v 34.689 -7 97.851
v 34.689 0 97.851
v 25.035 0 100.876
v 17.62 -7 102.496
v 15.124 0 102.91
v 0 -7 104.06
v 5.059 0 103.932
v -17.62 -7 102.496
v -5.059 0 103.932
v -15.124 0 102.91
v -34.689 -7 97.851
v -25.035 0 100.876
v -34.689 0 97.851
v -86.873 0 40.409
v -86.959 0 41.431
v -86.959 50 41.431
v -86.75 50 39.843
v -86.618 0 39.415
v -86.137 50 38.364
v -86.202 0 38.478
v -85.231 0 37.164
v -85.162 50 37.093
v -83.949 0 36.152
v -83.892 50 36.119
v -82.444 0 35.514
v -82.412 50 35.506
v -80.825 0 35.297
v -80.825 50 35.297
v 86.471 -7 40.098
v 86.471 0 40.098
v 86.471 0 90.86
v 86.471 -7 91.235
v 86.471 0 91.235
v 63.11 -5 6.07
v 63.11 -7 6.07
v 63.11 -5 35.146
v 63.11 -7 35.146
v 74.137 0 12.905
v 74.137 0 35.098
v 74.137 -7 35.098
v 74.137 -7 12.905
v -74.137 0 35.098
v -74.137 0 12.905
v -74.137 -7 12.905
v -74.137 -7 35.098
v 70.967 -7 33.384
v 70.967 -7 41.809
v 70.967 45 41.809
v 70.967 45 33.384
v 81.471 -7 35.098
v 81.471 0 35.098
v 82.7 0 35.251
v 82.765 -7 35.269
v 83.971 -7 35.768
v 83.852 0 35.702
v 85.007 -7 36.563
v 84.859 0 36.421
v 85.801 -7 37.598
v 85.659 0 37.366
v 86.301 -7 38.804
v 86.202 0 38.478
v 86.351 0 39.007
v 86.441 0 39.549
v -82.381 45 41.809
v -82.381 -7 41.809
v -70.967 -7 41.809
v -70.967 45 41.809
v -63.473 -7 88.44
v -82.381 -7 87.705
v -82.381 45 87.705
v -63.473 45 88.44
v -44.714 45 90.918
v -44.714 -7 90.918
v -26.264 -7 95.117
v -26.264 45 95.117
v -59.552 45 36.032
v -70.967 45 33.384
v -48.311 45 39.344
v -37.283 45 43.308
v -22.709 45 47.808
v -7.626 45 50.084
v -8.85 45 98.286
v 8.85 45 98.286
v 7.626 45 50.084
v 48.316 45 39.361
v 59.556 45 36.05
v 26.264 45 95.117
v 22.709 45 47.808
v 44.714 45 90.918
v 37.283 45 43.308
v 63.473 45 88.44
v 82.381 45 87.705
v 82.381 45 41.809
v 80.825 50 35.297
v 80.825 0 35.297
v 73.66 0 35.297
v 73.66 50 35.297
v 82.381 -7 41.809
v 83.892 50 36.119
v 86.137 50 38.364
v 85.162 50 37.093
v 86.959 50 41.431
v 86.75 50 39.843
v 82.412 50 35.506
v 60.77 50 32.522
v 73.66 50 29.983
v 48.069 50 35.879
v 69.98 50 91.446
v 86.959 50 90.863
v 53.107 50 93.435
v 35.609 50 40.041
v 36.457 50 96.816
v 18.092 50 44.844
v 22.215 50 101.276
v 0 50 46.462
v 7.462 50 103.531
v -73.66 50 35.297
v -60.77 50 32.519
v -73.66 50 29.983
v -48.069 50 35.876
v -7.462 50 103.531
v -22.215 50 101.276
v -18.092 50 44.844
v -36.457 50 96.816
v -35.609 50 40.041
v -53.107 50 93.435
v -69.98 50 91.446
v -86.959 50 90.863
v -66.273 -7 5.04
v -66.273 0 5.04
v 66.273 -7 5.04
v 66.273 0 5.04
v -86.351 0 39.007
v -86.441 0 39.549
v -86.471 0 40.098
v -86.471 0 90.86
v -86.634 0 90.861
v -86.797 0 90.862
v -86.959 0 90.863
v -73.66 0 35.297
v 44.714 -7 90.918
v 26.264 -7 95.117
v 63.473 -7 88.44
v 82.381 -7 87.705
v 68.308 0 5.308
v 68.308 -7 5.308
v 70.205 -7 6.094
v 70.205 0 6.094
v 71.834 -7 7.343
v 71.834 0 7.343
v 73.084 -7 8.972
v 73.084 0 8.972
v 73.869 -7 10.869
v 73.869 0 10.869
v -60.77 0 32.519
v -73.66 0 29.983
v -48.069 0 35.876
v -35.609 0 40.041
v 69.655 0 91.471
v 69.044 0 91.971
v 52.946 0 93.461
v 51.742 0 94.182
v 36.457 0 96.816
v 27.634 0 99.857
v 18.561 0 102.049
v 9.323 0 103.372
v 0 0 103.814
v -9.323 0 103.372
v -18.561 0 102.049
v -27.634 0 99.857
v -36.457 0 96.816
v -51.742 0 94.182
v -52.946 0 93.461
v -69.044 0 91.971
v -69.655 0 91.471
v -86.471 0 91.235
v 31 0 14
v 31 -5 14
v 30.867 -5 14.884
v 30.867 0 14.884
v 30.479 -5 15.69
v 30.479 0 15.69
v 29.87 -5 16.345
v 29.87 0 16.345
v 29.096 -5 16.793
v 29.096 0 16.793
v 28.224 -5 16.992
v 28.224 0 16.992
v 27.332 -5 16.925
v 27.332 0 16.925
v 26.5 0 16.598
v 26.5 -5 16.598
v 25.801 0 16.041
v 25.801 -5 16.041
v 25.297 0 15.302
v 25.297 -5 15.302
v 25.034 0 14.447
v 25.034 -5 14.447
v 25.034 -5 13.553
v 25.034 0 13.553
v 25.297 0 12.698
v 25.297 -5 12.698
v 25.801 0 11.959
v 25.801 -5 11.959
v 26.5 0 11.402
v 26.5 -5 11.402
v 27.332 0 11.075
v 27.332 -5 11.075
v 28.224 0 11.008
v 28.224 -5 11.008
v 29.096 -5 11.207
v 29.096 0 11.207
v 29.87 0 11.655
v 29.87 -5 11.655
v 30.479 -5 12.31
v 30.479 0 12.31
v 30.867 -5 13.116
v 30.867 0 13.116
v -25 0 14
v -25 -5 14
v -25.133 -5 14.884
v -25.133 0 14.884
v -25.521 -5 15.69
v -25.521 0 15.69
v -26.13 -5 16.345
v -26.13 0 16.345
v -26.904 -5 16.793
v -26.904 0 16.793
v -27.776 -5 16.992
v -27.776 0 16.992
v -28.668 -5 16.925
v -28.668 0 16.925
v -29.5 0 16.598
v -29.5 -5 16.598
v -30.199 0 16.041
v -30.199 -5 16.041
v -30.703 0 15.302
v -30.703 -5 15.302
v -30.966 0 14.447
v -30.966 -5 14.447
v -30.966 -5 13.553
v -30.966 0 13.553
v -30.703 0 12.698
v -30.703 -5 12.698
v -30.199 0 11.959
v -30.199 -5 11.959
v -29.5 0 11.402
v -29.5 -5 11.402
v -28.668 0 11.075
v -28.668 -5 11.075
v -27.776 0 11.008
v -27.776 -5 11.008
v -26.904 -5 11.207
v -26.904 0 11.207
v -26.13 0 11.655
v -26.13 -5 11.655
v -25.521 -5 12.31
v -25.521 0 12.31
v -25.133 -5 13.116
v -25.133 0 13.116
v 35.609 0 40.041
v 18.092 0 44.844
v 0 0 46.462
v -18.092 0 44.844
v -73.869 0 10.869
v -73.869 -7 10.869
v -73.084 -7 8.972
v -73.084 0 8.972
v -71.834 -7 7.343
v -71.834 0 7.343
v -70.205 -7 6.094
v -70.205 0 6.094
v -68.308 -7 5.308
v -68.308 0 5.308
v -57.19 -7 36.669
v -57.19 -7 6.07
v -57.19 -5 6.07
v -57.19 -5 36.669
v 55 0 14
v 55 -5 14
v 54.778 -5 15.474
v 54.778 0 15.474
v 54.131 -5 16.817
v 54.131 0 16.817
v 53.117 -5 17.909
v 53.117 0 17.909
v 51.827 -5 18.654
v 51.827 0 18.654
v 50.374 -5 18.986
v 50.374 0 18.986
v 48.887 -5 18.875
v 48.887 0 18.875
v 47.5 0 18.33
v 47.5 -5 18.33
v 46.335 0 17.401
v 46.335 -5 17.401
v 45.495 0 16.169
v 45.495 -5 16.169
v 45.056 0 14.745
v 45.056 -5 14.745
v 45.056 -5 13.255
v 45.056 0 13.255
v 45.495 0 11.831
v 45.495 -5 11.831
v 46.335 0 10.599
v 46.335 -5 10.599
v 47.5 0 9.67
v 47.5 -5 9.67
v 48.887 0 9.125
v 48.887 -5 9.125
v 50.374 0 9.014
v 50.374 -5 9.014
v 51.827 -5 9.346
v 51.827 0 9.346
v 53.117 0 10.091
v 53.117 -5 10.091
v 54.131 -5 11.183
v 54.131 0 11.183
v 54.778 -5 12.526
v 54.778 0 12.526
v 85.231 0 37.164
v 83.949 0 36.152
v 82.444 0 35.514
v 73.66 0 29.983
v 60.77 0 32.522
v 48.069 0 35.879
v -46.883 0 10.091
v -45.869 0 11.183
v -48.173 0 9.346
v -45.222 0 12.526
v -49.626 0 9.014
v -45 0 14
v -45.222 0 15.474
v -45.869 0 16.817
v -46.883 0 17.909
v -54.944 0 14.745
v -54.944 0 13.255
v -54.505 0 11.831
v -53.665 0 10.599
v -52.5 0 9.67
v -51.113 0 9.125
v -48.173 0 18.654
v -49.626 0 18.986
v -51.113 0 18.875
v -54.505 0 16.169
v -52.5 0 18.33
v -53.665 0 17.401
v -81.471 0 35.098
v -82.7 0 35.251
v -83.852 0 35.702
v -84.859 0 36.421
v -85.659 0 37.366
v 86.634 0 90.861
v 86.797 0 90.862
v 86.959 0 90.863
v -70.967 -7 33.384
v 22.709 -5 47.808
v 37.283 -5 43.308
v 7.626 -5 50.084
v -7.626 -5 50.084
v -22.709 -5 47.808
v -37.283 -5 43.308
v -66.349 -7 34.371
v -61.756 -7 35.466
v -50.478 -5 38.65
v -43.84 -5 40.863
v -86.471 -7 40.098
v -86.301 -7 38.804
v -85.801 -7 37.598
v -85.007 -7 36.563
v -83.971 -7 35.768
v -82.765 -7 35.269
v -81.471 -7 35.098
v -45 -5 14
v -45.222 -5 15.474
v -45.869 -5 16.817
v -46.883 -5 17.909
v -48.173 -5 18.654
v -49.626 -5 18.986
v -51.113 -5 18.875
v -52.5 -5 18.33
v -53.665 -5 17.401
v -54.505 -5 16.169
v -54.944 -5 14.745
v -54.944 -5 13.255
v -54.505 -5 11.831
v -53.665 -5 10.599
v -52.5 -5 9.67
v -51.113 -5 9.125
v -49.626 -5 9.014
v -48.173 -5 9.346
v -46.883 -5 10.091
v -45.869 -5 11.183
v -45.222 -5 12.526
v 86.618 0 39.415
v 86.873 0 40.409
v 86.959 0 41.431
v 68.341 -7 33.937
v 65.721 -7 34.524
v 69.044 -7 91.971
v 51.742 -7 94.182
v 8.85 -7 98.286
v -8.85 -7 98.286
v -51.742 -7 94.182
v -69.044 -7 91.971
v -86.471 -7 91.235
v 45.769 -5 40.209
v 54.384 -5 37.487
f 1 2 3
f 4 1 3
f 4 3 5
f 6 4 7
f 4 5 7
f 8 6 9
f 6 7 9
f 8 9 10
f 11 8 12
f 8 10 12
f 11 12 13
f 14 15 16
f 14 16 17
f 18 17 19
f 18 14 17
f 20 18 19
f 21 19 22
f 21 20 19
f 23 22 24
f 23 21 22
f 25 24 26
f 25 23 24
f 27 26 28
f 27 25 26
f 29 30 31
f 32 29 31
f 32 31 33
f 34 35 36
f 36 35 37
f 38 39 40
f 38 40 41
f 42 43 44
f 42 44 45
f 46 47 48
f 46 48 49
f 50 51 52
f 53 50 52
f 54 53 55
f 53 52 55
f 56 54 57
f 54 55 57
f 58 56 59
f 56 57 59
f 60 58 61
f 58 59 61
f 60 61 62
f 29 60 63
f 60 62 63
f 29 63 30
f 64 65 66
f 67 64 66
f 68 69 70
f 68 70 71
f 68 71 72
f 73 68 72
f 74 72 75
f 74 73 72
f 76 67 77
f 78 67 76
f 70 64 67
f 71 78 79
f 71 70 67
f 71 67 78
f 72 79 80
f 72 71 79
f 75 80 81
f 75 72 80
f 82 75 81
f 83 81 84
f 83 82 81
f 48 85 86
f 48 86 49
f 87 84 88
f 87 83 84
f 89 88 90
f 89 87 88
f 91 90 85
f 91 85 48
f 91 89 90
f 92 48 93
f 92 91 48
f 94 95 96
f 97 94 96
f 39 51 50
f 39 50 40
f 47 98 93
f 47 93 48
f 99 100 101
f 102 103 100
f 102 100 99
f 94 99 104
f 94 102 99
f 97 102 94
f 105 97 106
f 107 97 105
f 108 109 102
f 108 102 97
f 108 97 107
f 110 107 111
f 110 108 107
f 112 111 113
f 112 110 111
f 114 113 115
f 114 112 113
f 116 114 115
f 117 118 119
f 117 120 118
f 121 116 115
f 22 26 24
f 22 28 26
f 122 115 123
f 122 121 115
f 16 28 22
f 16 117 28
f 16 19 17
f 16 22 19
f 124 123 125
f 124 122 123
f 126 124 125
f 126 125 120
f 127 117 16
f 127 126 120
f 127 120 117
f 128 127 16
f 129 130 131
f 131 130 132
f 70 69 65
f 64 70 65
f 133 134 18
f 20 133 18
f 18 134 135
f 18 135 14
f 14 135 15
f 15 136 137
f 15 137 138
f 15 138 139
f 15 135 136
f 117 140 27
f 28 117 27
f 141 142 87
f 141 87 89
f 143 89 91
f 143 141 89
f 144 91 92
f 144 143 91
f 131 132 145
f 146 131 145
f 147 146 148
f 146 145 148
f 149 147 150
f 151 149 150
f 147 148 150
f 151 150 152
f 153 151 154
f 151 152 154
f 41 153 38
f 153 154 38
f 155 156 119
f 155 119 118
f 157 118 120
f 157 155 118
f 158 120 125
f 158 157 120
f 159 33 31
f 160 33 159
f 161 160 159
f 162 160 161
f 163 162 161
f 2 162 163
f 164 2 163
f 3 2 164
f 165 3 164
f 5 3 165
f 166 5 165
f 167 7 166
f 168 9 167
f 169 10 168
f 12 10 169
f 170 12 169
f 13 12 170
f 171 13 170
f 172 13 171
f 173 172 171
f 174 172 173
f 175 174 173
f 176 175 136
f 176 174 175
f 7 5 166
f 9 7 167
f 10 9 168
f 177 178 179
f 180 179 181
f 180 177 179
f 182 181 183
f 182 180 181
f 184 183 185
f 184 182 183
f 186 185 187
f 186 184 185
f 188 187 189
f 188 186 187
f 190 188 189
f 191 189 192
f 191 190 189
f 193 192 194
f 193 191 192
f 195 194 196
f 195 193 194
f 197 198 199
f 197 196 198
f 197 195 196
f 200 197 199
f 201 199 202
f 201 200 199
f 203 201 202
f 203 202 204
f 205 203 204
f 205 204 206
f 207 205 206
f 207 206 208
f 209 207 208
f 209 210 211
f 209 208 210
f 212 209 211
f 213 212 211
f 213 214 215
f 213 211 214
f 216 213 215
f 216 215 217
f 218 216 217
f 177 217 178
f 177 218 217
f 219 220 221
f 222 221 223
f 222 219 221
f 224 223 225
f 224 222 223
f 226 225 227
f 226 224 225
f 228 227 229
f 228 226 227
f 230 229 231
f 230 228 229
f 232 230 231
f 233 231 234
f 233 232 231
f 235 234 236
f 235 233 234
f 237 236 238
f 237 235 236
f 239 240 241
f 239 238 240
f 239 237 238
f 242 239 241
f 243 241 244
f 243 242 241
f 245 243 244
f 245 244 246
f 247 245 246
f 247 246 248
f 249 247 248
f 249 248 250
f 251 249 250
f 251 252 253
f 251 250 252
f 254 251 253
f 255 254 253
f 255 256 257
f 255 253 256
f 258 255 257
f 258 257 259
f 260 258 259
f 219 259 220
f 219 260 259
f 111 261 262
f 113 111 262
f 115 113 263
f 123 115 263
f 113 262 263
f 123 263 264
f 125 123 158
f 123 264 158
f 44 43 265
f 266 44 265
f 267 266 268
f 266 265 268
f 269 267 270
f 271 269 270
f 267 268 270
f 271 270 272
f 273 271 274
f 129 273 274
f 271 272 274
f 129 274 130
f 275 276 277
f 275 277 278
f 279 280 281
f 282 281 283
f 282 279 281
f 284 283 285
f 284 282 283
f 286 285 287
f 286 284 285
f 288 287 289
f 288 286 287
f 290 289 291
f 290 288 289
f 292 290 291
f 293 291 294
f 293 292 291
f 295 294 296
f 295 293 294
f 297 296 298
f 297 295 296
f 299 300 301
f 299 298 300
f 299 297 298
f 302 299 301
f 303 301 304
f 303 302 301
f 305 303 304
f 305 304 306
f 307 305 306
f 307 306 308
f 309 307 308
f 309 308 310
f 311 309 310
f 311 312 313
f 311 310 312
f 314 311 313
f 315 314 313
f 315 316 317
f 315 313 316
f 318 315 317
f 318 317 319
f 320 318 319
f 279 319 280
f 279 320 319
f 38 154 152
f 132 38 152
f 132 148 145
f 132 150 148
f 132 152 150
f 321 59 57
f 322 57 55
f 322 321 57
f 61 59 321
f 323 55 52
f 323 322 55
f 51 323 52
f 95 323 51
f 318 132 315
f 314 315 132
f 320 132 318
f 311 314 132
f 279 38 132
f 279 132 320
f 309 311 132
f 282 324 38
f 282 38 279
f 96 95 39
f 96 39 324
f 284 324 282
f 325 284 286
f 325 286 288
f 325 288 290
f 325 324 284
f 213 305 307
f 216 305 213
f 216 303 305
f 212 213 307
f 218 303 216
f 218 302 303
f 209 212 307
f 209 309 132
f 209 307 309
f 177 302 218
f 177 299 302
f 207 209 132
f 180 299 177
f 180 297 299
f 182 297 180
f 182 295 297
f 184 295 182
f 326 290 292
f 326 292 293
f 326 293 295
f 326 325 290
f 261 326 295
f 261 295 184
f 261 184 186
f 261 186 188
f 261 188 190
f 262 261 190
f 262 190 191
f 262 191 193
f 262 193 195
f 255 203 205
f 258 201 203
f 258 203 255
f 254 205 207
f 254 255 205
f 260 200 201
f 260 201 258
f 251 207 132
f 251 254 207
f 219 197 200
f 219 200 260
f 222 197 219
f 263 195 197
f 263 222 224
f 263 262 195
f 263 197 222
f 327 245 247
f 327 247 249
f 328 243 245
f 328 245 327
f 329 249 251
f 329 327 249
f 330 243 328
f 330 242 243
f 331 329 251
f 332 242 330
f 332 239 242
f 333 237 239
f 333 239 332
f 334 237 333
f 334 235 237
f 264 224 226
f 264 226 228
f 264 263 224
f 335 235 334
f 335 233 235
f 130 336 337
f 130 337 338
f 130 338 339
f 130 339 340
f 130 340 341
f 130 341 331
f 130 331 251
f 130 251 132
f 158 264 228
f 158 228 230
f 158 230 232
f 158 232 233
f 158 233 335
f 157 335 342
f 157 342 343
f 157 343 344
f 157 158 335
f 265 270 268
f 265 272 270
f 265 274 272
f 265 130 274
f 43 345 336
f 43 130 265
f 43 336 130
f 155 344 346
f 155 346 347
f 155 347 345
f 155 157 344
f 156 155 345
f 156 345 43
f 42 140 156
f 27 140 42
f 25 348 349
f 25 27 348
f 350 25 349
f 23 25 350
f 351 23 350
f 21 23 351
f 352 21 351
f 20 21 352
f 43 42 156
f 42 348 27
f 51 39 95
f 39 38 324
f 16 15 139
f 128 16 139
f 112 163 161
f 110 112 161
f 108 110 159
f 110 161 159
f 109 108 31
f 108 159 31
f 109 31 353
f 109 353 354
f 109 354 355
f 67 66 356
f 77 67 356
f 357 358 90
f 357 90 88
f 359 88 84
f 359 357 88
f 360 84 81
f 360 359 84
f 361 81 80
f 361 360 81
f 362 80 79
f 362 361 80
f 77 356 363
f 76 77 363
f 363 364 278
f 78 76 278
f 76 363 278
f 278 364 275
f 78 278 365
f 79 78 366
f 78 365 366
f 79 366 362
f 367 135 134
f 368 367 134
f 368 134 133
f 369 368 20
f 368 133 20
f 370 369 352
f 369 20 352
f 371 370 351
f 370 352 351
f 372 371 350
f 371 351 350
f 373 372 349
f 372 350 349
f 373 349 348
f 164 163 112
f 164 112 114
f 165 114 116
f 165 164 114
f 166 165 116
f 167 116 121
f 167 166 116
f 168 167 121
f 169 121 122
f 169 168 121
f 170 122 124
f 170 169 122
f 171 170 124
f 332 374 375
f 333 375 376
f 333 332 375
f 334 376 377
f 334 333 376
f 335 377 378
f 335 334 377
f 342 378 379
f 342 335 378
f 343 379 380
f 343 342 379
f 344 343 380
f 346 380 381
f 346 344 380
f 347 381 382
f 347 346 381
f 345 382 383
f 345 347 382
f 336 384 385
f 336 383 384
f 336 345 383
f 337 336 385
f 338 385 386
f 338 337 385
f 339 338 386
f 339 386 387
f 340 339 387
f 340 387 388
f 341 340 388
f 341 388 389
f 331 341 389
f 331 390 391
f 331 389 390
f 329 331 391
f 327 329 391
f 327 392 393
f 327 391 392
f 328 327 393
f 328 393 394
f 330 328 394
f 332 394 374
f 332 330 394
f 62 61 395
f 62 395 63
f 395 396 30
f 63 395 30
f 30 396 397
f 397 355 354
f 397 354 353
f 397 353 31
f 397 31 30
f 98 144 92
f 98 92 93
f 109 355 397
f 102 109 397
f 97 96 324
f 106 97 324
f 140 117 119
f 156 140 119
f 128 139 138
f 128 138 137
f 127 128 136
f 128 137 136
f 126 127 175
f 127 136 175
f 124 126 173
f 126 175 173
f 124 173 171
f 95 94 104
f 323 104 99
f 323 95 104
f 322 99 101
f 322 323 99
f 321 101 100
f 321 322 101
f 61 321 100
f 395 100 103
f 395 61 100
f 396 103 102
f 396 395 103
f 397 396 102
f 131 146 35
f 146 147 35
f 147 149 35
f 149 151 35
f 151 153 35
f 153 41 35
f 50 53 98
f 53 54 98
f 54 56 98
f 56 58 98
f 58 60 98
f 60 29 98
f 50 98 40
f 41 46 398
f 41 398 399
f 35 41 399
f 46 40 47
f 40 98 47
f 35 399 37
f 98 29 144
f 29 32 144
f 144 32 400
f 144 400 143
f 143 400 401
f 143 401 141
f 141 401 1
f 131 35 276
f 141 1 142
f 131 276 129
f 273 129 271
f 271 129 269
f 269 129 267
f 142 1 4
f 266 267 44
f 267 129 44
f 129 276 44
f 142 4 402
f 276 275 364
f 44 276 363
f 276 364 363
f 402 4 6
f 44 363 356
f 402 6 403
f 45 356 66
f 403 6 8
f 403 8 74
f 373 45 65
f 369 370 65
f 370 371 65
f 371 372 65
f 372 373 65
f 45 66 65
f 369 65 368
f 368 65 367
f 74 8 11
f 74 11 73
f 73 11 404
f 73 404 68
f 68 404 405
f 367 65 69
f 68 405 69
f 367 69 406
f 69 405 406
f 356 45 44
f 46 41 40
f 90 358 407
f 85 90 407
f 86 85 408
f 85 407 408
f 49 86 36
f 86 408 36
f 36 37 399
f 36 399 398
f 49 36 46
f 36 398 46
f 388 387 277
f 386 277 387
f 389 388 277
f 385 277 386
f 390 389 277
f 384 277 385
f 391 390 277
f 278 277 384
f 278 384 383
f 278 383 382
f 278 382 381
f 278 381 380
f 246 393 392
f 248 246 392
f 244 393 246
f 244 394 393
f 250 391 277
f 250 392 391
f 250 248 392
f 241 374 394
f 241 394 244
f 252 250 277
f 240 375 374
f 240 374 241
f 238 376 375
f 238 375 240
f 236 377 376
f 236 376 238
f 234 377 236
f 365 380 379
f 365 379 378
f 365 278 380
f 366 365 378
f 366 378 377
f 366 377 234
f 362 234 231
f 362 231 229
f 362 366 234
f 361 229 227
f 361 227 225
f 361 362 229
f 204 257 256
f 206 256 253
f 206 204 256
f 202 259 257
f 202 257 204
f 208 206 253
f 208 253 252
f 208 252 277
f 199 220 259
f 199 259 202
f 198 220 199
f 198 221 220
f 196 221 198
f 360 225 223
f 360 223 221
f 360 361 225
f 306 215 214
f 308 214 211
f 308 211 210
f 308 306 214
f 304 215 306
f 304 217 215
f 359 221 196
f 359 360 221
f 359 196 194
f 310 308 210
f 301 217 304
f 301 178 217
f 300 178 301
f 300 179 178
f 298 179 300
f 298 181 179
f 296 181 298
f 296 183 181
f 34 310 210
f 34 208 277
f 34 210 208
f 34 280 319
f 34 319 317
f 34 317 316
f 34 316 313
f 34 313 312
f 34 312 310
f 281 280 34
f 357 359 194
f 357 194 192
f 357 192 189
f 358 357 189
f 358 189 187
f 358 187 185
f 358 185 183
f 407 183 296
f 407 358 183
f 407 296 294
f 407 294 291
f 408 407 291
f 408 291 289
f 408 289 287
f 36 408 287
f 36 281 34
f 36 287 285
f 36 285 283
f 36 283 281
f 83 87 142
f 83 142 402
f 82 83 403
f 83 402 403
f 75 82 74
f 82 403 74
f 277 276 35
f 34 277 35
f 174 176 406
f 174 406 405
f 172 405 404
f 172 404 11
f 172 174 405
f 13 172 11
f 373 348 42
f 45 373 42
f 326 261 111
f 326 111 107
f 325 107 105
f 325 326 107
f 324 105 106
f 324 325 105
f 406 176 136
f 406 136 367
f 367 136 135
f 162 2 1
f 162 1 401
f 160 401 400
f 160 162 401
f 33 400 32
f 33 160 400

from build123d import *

# Parameters (mm, degrees)
SKETCH037_R     = 5
SKETCH037_R_2   = 3
PAD019_DEPTH    = 7
PAD020_DEPTH    = 50
POCKET019_DEPTH = 52
SKETCH055_W     = 120.3
SKETCH055_H     = 69.7
POCKET033_DEPTH = 2


with BuildPart() as part:
    # Sketch037 → Pad019 (new body)
    with BuildSketch(Plane.XZ):
        with BuildLine():
            Line((-74.137414, 12.904758), (-74.137414, 35.098297))
            Line((-81.471367, 35.098297), (-74.137414, 35.098297))
            ThreePointArc((-86.471367, 40.098297), (-85.006901, 36.562763), (-81.471367, 35.098297))
            Line((-86.471367, 91.234717), (-86.471367, 40.098297))
            ThreePointArc((-86.471367, 91.234717), (-60.36938, 92.892964), (-34.688969, 97.850786))
            ThreePointArc((34.688969, 97.850786), (0, 104.060193), (-34.688969, 97.850786))
            ThreePointArc((34.688969, 97.850786), (60.36938, 92.892964), (86.471367, 91.234717))
            Line((86.471367, 40.098297), (86.471367, 91.234717))
            ThreePointArc((81.471367, 35.098297), (85.006901, 36.562763), (86.471367, 40.098297))
            Line((81.471367, 35.098297), (74.137414, 35.098297))
            Line((74.137414, 35.098297), (74.137414, 12.904758))
            ThreePointArc((66.272551, 5.039896), (71.833849, 7.343461), (74.137414, 12.904758))
            Line((-66.272551, 5.039896), (66.272551, 5.039896))
            ThreePointArc((-74.137414, 12.904758), (-71.833849, 7.343461), (-66.272551, 5.039896))
        make_face()
        with Locations((50, 14)):
            Circle(SKETCH037_R, mode=Mode.SUBTRACT)
        with Locations((28, 14)):
            Circle(SKETCH037_R_2, mode=Mode.SUBTRACT)
        with Locations((-28, 14)):
            Circle(SKETCH037_R_2, mode=Mode.SUBTRACT)
        with Locations((-50, 14)):
            Circle(SKETCH037_R, mode=Mode.SUBTRACT)
    extrude(amount=PAD019_DEPTH)

    # Sketch038 → Pad020 (join)
    with BuildSketch(Plane.XZ):
        with BuildLine():
            ThreePointArc((-86.959112, 90.862971), (-61.522638, 92.265374), (-36.457272, 96.816017))
            ThreePointArc((36.457272, 96.816017), (0, 103.814452), (-36.457272, 96.816017))
            ThreePointArc((36.457272, 96.816017), (61.522638, 92.265374), (86.959112, 90.862971))
            Line((86.959112, 90.862971), (86.959112, 41.431149))
            ThreePointArc((80.824745, 35.296782), (85.162398, 37.093496), (86.959112, 41.431149))
            Line((80.824745, 35.296782), (73.659845, 35.296782))
            Line((73.659845, 35.296782), (73.659845, 29.983299))
            ThreePointArc((35.609044, 40.041003), (54.393041, 34.09886), (73.659845, 29.983299))
            ThreePointArc((35.609044, 40.041003), (0, 46.461552), (-35.609044, 40.041003))
            ThreePointArc((-73.659845, 29.983299), (-54.392205, 34.095699), (-35.609044, 40.041003))
            Line((-73.659845, 35.296782), (-73.659845, 29.983299))
            Line((-73.659845, 35.296782), (-80.824745, 35.296782))
            ThreePointArc((-86.959112, 41.431149), (-85.162398, 37.093496), (-80.824745, 35.296782))
            Line((-86.959112, 41.431149), (-86.959112, 90.862971))
        make_face()
    extrude(amount=-PAD020_DEPTH)

    # Sketch041 → Pocket019 (cut)
    with BuildSketch(Plane.XZ.offset(7)):
        with BuildLine():
            Line((-82.380554, 87.705044), (-82.380554, 41.80913))
            Line((-82.380554, 41.80913), (-70.96716, 41.80913))
            Line((-70.96716, 41.80913), (-70.96716, 33.384282))
            ThreePointArc((-70.96716, 33.384282), (-53.906892, 37.605949), (-37.282812, 43.308157))
            ThreePointArc((37.282812, 43.308157), (0, 50.369381), (-37.282812, 43.308157))
            ThreePointArc((37.282812, 43.308157), (53.912566, 37.625207), (70.96716, 33.384282))
            Line((70.96716, 41.80913), (70.96716, 33.384282))
            Line((82.380554, 41.80913), (70.96716, 41.80913))
            Line((82.380554, 87.705044), (82.380554, 41.80913))
            ThreePointArc((26.263667, 95.117414), (54.064692, 89.462391), (82.380554, 87.705044))
            ThreePointArc((26.263667, 95.117414), (0, 98.684945), (-26.263667, 95.117414))
            ThreePointArc((-82.380554, 87.705044), (-54.064692, 89.462391), (-26.263667, 95.117414))
        make_face()
    extrude(amount=-POCKET019_DEPTH, mode=Mode.SUBTRACT)

    # Sketch055 → Pocket033 (cut)
    with BuildSketch(Plane(origin=(6, -7, 41), x_dir=(1, 0, 0), z_dir=(0, -1, 0))):
        with Locations((-3.04, -0.08)):
            Rectangle(SKETCH055_W, SKETCH055_H)
    extrude(amount=-POCKET033_DEPTH, mode=Mode.SUBTRACT)


solid = part.part
